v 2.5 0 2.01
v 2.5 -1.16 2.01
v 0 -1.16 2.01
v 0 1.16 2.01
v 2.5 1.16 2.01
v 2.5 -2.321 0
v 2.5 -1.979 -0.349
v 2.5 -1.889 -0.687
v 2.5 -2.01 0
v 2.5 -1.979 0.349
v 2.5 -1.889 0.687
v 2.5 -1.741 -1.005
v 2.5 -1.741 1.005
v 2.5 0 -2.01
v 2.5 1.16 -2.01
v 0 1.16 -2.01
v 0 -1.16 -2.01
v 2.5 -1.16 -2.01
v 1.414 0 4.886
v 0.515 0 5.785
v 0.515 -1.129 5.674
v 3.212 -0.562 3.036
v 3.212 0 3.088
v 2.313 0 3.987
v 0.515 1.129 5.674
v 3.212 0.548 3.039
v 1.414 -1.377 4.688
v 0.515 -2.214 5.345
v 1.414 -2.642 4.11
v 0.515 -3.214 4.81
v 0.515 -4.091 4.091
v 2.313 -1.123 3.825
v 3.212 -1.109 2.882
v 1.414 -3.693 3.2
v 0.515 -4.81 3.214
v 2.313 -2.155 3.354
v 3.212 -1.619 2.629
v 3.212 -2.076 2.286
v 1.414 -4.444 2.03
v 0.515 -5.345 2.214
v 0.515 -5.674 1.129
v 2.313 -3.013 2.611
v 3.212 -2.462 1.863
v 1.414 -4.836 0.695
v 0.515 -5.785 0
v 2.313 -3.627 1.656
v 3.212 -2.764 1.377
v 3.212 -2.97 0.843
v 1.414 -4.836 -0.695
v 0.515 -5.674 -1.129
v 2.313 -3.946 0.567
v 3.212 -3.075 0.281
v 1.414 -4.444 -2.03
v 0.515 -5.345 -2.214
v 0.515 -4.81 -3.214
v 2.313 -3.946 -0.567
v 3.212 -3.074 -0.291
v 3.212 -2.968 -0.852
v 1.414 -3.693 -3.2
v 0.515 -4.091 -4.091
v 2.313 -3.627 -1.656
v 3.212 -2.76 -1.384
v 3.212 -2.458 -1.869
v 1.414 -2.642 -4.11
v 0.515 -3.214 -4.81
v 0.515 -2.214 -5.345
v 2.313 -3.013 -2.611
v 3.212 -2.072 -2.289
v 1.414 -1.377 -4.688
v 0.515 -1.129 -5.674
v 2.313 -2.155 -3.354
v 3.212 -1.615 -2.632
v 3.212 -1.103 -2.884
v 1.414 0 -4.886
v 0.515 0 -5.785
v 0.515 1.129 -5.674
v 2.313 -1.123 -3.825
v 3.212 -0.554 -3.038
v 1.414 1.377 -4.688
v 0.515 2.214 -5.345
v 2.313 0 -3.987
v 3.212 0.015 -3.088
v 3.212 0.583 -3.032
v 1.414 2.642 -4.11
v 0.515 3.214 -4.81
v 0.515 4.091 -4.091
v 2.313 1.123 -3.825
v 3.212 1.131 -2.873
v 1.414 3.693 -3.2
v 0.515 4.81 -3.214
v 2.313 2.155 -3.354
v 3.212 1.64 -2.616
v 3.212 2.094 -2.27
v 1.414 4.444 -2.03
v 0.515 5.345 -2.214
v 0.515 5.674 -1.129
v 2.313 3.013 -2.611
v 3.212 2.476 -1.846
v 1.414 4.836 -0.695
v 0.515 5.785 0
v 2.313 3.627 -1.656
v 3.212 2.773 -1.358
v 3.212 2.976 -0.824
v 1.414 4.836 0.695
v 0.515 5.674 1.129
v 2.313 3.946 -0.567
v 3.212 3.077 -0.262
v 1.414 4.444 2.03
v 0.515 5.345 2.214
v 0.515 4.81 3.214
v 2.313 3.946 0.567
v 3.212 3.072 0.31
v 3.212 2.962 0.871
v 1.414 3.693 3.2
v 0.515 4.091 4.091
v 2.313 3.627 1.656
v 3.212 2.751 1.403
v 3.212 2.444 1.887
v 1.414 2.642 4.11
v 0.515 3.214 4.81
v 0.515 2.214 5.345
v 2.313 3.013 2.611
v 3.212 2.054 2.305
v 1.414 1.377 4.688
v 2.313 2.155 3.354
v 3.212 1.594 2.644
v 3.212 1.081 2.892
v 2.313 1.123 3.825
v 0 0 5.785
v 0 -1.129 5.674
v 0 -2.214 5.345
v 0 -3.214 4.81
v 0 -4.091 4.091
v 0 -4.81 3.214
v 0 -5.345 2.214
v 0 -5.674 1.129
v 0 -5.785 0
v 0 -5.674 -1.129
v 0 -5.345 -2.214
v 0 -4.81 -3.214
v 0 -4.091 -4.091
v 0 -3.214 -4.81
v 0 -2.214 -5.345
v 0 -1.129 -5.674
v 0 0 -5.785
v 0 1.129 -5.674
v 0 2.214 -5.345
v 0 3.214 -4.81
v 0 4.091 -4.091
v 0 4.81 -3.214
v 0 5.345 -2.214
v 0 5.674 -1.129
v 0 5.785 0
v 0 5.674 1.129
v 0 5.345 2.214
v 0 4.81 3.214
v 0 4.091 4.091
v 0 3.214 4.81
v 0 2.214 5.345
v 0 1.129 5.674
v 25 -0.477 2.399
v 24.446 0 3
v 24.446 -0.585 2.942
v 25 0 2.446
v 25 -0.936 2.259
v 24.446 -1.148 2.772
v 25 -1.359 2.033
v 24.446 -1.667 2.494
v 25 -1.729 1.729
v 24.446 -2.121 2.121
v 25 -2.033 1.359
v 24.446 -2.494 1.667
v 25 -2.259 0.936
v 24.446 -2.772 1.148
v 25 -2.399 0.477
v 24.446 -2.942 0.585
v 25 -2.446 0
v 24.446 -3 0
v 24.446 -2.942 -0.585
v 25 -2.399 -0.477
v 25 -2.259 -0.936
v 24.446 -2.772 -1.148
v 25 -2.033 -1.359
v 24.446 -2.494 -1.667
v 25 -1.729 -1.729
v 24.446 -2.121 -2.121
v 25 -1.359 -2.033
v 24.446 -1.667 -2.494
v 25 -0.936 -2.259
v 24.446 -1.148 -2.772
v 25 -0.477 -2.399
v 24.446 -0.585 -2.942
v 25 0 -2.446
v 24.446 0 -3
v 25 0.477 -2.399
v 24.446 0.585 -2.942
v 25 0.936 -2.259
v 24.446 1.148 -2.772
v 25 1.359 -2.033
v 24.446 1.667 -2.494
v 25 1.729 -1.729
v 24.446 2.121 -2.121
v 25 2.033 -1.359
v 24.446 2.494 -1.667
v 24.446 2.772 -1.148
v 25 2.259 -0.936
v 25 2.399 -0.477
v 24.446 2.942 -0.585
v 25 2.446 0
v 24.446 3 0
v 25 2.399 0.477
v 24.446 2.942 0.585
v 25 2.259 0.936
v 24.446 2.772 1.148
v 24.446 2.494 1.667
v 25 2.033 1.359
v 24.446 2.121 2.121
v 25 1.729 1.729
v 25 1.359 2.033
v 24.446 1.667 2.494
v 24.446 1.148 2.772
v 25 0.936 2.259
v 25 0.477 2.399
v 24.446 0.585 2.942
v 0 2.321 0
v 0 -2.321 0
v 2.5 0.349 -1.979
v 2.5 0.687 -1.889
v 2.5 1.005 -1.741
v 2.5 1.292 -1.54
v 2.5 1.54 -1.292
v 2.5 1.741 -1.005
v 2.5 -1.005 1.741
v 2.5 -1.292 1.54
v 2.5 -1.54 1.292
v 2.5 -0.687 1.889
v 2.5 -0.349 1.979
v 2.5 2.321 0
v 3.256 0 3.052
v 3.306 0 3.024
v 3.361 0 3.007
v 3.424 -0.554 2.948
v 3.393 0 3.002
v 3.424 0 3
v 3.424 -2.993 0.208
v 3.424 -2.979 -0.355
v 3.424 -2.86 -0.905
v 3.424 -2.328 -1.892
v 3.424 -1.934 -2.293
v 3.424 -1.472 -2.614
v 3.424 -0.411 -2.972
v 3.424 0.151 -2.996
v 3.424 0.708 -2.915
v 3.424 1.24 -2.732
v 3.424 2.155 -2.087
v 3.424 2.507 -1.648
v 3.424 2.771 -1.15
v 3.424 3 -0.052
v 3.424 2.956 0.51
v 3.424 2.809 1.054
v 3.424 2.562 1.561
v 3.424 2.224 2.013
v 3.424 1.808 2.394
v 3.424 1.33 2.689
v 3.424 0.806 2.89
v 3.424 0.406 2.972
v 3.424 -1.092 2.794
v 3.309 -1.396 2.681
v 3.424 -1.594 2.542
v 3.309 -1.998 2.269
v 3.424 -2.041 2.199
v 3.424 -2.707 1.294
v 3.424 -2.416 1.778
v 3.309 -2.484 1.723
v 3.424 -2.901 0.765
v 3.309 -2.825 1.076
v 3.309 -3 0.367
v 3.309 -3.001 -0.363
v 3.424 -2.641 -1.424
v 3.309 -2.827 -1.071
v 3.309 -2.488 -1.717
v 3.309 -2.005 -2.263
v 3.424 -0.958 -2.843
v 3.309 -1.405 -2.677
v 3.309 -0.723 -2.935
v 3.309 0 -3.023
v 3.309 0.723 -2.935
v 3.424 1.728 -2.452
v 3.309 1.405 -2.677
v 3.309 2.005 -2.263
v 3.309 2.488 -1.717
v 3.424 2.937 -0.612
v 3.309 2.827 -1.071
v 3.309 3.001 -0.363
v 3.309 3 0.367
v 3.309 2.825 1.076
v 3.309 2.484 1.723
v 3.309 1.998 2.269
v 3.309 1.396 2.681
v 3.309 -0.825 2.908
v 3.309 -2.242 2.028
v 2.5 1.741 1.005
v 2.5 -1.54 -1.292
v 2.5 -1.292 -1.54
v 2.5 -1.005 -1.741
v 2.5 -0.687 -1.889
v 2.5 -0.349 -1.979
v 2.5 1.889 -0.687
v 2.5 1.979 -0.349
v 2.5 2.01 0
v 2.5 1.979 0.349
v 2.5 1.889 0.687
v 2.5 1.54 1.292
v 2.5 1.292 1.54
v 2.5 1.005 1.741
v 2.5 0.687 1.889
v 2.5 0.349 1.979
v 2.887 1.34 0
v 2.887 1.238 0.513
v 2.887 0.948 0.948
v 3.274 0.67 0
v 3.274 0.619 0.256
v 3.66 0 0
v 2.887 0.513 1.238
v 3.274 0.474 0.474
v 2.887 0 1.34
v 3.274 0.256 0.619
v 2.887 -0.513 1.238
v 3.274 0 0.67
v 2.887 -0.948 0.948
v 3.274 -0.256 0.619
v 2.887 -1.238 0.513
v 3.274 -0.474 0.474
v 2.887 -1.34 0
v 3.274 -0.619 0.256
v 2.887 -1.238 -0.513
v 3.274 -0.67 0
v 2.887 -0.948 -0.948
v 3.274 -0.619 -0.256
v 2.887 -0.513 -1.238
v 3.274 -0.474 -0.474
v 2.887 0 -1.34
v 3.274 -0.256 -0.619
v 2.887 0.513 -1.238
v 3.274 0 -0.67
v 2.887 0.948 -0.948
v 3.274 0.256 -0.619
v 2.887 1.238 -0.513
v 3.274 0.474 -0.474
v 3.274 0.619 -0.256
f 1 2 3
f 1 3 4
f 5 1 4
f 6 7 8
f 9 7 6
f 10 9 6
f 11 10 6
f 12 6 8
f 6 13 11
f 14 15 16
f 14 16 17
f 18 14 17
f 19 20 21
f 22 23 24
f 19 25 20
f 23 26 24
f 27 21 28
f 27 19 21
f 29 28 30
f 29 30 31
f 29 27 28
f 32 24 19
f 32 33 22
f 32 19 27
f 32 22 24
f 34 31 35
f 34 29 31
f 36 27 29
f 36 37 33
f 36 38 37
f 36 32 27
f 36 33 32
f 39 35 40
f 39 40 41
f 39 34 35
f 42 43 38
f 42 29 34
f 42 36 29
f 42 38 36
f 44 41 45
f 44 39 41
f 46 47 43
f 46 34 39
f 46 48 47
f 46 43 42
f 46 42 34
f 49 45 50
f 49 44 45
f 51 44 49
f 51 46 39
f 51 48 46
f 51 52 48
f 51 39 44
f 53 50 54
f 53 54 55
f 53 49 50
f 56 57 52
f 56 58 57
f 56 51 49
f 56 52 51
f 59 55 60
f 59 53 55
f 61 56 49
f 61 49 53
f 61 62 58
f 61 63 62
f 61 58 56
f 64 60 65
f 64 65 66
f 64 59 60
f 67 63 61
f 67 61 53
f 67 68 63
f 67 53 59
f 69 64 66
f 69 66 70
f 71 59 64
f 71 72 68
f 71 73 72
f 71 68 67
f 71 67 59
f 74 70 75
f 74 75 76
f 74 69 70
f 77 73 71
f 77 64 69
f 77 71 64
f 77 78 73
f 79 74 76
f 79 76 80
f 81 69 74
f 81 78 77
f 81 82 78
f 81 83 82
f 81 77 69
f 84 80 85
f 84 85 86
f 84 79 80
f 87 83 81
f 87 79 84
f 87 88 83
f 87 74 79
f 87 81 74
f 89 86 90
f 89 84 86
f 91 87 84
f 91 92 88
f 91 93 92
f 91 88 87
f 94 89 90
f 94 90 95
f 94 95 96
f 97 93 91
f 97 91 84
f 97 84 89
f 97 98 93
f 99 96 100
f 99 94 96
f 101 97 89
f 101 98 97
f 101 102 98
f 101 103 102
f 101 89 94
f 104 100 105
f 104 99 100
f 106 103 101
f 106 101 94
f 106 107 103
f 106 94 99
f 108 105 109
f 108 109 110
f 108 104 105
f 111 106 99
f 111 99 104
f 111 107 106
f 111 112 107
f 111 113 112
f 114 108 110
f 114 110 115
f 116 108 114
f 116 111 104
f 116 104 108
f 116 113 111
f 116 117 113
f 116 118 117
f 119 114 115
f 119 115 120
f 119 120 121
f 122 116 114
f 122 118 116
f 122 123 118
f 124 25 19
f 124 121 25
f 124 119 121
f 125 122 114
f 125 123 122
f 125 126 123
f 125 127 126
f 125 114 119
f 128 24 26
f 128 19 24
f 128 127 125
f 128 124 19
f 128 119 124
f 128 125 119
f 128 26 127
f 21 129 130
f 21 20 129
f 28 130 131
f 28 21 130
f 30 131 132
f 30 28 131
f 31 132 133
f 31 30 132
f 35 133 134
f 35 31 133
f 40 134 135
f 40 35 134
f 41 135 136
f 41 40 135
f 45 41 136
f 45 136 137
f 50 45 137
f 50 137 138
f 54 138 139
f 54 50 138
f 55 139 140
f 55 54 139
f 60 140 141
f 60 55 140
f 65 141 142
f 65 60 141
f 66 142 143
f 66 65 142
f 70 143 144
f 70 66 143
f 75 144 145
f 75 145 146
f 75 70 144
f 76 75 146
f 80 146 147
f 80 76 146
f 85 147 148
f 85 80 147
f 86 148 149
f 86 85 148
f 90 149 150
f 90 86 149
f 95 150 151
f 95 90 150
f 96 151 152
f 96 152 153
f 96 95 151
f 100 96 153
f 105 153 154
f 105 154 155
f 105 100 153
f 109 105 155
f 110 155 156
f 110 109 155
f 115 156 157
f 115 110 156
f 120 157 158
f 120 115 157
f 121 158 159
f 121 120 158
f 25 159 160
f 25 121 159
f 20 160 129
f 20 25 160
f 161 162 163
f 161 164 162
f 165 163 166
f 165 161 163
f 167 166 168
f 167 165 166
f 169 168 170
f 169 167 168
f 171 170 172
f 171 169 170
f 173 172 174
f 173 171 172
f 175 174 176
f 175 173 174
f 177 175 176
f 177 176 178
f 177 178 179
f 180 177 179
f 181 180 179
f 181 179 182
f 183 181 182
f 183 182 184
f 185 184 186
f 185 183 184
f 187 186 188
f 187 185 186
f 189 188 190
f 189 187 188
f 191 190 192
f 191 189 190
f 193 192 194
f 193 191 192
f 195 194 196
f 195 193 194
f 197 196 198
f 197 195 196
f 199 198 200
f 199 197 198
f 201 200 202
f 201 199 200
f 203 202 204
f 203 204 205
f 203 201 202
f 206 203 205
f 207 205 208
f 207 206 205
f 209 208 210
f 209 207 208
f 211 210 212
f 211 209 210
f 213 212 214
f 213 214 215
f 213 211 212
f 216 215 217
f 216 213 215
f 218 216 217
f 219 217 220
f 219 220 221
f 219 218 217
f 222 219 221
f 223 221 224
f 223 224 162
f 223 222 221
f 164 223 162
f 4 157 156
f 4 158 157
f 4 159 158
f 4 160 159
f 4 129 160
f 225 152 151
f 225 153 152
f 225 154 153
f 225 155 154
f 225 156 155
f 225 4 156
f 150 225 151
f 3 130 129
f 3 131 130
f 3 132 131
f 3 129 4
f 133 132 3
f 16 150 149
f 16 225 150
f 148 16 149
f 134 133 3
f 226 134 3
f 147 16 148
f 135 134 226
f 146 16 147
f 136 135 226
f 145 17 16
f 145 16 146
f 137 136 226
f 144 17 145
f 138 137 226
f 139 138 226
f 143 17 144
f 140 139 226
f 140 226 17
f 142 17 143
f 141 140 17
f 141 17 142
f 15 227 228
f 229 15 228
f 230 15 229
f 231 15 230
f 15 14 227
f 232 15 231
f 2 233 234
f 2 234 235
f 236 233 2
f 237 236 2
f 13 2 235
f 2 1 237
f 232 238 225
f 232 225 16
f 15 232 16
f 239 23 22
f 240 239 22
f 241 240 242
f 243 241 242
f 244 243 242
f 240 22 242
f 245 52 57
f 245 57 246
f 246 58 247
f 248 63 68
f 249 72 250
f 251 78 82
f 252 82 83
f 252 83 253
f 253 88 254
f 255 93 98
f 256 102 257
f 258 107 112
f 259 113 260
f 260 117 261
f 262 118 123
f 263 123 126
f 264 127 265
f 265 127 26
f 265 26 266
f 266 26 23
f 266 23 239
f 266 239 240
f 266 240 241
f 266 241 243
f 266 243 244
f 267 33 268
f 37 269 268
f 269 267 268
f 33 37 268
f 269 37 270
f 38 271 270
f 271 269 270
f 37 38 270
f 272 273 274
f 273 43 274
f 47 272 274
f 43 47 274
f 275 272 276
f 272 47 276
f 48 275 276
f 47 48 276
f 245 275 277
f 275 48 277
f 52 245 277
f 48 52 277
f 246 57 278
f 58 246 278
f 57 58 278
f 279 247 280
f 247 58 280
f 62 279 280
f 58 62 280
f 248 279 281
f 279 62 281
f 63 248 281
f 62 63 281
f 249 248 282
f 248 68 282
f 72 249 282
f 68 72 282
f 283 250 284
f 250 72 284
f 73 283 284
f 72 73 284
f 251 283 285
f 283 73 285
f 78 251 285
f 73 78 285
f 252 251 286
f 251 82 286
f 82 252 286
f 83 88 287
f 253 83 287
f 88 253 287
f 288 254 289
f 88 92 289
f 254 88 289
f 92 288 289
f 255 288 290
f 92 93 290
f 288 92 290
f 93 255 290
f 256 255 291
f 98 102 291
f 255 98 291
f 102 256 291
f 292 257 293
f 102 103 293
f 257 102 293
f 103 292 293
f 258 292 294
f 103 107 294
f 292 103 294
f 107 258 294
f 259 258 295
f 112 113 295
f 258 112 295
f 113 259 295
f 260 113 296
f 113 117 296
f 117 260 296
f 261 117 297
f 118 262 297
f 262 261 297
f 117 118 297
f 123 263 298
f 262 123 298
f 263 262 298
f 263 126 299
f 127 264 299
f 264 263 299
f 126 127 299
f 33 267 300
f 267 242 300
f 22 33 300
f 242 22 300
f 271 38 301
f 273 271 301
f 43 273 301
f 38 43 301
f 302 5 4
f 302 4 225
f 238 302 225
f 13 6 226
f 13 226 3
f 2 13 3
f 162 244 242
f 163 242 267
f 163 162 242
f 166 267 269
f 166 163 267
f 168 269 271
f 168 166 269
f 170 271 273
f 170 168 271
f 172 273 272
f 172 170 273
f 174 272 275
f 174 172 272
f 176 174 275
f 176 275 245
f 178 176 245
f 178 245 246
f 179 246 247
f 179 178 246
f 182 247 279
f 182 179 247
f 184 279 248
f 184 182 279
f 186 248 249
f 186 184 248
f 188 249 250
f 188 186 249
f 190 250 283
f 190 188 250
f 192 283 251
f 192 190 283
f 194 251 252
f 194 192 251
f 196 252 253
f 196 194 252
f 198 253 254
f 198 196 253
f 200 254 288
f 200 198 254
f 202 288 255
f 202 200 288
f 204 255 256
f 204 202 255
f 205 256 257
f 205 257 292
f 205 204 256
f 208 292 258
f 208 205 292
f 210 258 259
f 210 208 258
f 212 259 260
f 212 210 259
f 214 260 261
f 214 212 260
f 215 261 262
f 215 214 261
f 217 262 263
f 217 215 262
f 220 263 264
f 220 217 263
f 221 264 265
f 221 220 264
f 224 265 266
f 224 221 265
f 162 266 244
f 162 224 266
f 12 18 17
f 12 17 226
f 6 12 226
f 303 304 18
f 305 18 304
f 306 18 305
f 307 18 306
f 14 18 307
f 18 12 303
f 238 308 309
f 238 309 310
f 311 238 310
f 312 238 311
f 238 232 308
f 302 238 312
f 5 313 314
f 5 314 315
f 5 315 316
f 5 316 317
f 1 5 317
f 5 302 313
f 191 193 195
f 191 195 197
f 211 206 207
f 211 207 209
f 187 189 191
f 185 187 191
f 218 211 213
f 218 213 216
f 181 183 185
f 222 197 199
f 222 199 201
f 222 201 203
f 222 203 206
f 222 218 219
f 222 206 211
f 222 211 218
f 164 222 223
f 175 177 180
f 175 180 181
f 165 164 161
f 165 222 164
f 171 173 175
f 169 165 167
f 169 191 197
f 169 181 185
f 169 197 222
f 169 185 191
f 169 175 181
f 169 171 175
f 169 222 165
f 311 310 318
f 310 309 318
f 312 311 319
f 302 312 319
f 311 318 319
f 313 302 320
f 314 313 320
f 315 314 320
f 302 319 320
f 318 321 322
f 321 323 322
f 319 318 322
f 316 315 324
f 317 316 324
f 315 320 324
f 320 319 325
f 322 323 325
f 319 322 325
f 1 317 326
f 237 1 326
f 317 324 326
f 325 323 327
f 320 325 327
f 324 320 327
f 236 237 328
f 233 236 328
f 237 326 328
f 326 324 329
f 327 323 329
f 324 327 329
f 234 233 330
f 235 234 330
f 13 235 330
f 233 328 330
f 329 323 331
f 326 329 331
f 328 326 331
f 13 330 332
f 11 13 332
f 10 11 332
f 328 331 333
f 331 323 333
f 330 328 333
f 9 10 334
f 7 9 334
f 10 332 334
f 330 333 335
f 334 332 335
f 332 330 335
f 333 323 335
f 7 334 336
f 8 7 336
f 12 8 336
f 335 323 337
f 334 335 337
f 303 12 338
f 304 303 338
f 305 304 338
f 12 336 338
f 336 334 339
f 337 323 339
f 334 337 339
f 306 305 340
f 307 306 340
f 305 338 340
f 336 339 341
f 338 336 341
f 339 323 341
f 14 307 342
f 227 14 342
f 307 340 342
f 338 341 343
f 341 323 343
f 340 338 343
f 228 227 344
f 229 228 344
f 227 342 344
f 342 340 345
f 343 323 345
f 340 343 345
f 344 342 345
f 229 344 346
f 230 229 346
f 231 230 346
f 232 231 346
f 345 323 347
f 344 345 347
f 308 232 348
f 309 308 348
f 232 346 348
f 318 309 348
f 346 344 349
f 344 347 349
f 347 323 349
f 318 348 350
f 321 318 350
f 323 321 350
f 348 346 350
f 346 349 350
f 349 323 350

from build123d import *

# Parameters (mm, degrees)
FILLET1_R   = 0.3
HEX_START   = -2.5
HEX_2_DEPTH = 2.5


with BuildPart() as part:
    # BodySke → BaseBody (revolve)
    with BuildSketch(Plane.XY, mode=Mode.PRIVATE) as basebody_sk:
        Polygon((0, 0), (0, 5.785), (0.515, 5.785), (3.3, 3), (24.4455, 3), (25, 2.4455), (25, 0), align=None)
    revolve(basebody_sk.sketch.rotate(Axis((0, 0, 0), (1, 0, 0)), 90), axis=Axis((0, 0, 0), (1, 0, 0)))

    # Fillet1
    fillet1_edges = [part.edges().sort_by_distance(p)[0] for p in [
        (3.3, 0, -3),
    ]]
    fillet(fillet1_edges, radius=FILLET1_R)

    # Hex 2: read off the stored shape, not the designer's step
    # Hex 2 outline → Hex 2 (cut)
    with BuildSketch(Plane.ZY.offset(HEX_START)):
        Polygon((-2.01, -1.160474041), (0, -2.320948082), (2.01, -1.160474041), (2.01, 1.160474041), (0, 2.320948082), (-2.01, 1.160474041), align=None)
    extrude(amount=HEX_2_DEPTH, mode=Mode.SUBTRACT)

    # Hex 2 2 outline → Hex 2 2 (revolve, cut)
    with BuildSketch(Plane.YX):
        Polygon((2.01, 2.5), (0, 3.660474041), (0, 2.5), align=None)
    revolve(axis=Axis((0, 0, 0), (1, 0, 0)), mode=Mode.SUBTRACT)


solid = part.part
